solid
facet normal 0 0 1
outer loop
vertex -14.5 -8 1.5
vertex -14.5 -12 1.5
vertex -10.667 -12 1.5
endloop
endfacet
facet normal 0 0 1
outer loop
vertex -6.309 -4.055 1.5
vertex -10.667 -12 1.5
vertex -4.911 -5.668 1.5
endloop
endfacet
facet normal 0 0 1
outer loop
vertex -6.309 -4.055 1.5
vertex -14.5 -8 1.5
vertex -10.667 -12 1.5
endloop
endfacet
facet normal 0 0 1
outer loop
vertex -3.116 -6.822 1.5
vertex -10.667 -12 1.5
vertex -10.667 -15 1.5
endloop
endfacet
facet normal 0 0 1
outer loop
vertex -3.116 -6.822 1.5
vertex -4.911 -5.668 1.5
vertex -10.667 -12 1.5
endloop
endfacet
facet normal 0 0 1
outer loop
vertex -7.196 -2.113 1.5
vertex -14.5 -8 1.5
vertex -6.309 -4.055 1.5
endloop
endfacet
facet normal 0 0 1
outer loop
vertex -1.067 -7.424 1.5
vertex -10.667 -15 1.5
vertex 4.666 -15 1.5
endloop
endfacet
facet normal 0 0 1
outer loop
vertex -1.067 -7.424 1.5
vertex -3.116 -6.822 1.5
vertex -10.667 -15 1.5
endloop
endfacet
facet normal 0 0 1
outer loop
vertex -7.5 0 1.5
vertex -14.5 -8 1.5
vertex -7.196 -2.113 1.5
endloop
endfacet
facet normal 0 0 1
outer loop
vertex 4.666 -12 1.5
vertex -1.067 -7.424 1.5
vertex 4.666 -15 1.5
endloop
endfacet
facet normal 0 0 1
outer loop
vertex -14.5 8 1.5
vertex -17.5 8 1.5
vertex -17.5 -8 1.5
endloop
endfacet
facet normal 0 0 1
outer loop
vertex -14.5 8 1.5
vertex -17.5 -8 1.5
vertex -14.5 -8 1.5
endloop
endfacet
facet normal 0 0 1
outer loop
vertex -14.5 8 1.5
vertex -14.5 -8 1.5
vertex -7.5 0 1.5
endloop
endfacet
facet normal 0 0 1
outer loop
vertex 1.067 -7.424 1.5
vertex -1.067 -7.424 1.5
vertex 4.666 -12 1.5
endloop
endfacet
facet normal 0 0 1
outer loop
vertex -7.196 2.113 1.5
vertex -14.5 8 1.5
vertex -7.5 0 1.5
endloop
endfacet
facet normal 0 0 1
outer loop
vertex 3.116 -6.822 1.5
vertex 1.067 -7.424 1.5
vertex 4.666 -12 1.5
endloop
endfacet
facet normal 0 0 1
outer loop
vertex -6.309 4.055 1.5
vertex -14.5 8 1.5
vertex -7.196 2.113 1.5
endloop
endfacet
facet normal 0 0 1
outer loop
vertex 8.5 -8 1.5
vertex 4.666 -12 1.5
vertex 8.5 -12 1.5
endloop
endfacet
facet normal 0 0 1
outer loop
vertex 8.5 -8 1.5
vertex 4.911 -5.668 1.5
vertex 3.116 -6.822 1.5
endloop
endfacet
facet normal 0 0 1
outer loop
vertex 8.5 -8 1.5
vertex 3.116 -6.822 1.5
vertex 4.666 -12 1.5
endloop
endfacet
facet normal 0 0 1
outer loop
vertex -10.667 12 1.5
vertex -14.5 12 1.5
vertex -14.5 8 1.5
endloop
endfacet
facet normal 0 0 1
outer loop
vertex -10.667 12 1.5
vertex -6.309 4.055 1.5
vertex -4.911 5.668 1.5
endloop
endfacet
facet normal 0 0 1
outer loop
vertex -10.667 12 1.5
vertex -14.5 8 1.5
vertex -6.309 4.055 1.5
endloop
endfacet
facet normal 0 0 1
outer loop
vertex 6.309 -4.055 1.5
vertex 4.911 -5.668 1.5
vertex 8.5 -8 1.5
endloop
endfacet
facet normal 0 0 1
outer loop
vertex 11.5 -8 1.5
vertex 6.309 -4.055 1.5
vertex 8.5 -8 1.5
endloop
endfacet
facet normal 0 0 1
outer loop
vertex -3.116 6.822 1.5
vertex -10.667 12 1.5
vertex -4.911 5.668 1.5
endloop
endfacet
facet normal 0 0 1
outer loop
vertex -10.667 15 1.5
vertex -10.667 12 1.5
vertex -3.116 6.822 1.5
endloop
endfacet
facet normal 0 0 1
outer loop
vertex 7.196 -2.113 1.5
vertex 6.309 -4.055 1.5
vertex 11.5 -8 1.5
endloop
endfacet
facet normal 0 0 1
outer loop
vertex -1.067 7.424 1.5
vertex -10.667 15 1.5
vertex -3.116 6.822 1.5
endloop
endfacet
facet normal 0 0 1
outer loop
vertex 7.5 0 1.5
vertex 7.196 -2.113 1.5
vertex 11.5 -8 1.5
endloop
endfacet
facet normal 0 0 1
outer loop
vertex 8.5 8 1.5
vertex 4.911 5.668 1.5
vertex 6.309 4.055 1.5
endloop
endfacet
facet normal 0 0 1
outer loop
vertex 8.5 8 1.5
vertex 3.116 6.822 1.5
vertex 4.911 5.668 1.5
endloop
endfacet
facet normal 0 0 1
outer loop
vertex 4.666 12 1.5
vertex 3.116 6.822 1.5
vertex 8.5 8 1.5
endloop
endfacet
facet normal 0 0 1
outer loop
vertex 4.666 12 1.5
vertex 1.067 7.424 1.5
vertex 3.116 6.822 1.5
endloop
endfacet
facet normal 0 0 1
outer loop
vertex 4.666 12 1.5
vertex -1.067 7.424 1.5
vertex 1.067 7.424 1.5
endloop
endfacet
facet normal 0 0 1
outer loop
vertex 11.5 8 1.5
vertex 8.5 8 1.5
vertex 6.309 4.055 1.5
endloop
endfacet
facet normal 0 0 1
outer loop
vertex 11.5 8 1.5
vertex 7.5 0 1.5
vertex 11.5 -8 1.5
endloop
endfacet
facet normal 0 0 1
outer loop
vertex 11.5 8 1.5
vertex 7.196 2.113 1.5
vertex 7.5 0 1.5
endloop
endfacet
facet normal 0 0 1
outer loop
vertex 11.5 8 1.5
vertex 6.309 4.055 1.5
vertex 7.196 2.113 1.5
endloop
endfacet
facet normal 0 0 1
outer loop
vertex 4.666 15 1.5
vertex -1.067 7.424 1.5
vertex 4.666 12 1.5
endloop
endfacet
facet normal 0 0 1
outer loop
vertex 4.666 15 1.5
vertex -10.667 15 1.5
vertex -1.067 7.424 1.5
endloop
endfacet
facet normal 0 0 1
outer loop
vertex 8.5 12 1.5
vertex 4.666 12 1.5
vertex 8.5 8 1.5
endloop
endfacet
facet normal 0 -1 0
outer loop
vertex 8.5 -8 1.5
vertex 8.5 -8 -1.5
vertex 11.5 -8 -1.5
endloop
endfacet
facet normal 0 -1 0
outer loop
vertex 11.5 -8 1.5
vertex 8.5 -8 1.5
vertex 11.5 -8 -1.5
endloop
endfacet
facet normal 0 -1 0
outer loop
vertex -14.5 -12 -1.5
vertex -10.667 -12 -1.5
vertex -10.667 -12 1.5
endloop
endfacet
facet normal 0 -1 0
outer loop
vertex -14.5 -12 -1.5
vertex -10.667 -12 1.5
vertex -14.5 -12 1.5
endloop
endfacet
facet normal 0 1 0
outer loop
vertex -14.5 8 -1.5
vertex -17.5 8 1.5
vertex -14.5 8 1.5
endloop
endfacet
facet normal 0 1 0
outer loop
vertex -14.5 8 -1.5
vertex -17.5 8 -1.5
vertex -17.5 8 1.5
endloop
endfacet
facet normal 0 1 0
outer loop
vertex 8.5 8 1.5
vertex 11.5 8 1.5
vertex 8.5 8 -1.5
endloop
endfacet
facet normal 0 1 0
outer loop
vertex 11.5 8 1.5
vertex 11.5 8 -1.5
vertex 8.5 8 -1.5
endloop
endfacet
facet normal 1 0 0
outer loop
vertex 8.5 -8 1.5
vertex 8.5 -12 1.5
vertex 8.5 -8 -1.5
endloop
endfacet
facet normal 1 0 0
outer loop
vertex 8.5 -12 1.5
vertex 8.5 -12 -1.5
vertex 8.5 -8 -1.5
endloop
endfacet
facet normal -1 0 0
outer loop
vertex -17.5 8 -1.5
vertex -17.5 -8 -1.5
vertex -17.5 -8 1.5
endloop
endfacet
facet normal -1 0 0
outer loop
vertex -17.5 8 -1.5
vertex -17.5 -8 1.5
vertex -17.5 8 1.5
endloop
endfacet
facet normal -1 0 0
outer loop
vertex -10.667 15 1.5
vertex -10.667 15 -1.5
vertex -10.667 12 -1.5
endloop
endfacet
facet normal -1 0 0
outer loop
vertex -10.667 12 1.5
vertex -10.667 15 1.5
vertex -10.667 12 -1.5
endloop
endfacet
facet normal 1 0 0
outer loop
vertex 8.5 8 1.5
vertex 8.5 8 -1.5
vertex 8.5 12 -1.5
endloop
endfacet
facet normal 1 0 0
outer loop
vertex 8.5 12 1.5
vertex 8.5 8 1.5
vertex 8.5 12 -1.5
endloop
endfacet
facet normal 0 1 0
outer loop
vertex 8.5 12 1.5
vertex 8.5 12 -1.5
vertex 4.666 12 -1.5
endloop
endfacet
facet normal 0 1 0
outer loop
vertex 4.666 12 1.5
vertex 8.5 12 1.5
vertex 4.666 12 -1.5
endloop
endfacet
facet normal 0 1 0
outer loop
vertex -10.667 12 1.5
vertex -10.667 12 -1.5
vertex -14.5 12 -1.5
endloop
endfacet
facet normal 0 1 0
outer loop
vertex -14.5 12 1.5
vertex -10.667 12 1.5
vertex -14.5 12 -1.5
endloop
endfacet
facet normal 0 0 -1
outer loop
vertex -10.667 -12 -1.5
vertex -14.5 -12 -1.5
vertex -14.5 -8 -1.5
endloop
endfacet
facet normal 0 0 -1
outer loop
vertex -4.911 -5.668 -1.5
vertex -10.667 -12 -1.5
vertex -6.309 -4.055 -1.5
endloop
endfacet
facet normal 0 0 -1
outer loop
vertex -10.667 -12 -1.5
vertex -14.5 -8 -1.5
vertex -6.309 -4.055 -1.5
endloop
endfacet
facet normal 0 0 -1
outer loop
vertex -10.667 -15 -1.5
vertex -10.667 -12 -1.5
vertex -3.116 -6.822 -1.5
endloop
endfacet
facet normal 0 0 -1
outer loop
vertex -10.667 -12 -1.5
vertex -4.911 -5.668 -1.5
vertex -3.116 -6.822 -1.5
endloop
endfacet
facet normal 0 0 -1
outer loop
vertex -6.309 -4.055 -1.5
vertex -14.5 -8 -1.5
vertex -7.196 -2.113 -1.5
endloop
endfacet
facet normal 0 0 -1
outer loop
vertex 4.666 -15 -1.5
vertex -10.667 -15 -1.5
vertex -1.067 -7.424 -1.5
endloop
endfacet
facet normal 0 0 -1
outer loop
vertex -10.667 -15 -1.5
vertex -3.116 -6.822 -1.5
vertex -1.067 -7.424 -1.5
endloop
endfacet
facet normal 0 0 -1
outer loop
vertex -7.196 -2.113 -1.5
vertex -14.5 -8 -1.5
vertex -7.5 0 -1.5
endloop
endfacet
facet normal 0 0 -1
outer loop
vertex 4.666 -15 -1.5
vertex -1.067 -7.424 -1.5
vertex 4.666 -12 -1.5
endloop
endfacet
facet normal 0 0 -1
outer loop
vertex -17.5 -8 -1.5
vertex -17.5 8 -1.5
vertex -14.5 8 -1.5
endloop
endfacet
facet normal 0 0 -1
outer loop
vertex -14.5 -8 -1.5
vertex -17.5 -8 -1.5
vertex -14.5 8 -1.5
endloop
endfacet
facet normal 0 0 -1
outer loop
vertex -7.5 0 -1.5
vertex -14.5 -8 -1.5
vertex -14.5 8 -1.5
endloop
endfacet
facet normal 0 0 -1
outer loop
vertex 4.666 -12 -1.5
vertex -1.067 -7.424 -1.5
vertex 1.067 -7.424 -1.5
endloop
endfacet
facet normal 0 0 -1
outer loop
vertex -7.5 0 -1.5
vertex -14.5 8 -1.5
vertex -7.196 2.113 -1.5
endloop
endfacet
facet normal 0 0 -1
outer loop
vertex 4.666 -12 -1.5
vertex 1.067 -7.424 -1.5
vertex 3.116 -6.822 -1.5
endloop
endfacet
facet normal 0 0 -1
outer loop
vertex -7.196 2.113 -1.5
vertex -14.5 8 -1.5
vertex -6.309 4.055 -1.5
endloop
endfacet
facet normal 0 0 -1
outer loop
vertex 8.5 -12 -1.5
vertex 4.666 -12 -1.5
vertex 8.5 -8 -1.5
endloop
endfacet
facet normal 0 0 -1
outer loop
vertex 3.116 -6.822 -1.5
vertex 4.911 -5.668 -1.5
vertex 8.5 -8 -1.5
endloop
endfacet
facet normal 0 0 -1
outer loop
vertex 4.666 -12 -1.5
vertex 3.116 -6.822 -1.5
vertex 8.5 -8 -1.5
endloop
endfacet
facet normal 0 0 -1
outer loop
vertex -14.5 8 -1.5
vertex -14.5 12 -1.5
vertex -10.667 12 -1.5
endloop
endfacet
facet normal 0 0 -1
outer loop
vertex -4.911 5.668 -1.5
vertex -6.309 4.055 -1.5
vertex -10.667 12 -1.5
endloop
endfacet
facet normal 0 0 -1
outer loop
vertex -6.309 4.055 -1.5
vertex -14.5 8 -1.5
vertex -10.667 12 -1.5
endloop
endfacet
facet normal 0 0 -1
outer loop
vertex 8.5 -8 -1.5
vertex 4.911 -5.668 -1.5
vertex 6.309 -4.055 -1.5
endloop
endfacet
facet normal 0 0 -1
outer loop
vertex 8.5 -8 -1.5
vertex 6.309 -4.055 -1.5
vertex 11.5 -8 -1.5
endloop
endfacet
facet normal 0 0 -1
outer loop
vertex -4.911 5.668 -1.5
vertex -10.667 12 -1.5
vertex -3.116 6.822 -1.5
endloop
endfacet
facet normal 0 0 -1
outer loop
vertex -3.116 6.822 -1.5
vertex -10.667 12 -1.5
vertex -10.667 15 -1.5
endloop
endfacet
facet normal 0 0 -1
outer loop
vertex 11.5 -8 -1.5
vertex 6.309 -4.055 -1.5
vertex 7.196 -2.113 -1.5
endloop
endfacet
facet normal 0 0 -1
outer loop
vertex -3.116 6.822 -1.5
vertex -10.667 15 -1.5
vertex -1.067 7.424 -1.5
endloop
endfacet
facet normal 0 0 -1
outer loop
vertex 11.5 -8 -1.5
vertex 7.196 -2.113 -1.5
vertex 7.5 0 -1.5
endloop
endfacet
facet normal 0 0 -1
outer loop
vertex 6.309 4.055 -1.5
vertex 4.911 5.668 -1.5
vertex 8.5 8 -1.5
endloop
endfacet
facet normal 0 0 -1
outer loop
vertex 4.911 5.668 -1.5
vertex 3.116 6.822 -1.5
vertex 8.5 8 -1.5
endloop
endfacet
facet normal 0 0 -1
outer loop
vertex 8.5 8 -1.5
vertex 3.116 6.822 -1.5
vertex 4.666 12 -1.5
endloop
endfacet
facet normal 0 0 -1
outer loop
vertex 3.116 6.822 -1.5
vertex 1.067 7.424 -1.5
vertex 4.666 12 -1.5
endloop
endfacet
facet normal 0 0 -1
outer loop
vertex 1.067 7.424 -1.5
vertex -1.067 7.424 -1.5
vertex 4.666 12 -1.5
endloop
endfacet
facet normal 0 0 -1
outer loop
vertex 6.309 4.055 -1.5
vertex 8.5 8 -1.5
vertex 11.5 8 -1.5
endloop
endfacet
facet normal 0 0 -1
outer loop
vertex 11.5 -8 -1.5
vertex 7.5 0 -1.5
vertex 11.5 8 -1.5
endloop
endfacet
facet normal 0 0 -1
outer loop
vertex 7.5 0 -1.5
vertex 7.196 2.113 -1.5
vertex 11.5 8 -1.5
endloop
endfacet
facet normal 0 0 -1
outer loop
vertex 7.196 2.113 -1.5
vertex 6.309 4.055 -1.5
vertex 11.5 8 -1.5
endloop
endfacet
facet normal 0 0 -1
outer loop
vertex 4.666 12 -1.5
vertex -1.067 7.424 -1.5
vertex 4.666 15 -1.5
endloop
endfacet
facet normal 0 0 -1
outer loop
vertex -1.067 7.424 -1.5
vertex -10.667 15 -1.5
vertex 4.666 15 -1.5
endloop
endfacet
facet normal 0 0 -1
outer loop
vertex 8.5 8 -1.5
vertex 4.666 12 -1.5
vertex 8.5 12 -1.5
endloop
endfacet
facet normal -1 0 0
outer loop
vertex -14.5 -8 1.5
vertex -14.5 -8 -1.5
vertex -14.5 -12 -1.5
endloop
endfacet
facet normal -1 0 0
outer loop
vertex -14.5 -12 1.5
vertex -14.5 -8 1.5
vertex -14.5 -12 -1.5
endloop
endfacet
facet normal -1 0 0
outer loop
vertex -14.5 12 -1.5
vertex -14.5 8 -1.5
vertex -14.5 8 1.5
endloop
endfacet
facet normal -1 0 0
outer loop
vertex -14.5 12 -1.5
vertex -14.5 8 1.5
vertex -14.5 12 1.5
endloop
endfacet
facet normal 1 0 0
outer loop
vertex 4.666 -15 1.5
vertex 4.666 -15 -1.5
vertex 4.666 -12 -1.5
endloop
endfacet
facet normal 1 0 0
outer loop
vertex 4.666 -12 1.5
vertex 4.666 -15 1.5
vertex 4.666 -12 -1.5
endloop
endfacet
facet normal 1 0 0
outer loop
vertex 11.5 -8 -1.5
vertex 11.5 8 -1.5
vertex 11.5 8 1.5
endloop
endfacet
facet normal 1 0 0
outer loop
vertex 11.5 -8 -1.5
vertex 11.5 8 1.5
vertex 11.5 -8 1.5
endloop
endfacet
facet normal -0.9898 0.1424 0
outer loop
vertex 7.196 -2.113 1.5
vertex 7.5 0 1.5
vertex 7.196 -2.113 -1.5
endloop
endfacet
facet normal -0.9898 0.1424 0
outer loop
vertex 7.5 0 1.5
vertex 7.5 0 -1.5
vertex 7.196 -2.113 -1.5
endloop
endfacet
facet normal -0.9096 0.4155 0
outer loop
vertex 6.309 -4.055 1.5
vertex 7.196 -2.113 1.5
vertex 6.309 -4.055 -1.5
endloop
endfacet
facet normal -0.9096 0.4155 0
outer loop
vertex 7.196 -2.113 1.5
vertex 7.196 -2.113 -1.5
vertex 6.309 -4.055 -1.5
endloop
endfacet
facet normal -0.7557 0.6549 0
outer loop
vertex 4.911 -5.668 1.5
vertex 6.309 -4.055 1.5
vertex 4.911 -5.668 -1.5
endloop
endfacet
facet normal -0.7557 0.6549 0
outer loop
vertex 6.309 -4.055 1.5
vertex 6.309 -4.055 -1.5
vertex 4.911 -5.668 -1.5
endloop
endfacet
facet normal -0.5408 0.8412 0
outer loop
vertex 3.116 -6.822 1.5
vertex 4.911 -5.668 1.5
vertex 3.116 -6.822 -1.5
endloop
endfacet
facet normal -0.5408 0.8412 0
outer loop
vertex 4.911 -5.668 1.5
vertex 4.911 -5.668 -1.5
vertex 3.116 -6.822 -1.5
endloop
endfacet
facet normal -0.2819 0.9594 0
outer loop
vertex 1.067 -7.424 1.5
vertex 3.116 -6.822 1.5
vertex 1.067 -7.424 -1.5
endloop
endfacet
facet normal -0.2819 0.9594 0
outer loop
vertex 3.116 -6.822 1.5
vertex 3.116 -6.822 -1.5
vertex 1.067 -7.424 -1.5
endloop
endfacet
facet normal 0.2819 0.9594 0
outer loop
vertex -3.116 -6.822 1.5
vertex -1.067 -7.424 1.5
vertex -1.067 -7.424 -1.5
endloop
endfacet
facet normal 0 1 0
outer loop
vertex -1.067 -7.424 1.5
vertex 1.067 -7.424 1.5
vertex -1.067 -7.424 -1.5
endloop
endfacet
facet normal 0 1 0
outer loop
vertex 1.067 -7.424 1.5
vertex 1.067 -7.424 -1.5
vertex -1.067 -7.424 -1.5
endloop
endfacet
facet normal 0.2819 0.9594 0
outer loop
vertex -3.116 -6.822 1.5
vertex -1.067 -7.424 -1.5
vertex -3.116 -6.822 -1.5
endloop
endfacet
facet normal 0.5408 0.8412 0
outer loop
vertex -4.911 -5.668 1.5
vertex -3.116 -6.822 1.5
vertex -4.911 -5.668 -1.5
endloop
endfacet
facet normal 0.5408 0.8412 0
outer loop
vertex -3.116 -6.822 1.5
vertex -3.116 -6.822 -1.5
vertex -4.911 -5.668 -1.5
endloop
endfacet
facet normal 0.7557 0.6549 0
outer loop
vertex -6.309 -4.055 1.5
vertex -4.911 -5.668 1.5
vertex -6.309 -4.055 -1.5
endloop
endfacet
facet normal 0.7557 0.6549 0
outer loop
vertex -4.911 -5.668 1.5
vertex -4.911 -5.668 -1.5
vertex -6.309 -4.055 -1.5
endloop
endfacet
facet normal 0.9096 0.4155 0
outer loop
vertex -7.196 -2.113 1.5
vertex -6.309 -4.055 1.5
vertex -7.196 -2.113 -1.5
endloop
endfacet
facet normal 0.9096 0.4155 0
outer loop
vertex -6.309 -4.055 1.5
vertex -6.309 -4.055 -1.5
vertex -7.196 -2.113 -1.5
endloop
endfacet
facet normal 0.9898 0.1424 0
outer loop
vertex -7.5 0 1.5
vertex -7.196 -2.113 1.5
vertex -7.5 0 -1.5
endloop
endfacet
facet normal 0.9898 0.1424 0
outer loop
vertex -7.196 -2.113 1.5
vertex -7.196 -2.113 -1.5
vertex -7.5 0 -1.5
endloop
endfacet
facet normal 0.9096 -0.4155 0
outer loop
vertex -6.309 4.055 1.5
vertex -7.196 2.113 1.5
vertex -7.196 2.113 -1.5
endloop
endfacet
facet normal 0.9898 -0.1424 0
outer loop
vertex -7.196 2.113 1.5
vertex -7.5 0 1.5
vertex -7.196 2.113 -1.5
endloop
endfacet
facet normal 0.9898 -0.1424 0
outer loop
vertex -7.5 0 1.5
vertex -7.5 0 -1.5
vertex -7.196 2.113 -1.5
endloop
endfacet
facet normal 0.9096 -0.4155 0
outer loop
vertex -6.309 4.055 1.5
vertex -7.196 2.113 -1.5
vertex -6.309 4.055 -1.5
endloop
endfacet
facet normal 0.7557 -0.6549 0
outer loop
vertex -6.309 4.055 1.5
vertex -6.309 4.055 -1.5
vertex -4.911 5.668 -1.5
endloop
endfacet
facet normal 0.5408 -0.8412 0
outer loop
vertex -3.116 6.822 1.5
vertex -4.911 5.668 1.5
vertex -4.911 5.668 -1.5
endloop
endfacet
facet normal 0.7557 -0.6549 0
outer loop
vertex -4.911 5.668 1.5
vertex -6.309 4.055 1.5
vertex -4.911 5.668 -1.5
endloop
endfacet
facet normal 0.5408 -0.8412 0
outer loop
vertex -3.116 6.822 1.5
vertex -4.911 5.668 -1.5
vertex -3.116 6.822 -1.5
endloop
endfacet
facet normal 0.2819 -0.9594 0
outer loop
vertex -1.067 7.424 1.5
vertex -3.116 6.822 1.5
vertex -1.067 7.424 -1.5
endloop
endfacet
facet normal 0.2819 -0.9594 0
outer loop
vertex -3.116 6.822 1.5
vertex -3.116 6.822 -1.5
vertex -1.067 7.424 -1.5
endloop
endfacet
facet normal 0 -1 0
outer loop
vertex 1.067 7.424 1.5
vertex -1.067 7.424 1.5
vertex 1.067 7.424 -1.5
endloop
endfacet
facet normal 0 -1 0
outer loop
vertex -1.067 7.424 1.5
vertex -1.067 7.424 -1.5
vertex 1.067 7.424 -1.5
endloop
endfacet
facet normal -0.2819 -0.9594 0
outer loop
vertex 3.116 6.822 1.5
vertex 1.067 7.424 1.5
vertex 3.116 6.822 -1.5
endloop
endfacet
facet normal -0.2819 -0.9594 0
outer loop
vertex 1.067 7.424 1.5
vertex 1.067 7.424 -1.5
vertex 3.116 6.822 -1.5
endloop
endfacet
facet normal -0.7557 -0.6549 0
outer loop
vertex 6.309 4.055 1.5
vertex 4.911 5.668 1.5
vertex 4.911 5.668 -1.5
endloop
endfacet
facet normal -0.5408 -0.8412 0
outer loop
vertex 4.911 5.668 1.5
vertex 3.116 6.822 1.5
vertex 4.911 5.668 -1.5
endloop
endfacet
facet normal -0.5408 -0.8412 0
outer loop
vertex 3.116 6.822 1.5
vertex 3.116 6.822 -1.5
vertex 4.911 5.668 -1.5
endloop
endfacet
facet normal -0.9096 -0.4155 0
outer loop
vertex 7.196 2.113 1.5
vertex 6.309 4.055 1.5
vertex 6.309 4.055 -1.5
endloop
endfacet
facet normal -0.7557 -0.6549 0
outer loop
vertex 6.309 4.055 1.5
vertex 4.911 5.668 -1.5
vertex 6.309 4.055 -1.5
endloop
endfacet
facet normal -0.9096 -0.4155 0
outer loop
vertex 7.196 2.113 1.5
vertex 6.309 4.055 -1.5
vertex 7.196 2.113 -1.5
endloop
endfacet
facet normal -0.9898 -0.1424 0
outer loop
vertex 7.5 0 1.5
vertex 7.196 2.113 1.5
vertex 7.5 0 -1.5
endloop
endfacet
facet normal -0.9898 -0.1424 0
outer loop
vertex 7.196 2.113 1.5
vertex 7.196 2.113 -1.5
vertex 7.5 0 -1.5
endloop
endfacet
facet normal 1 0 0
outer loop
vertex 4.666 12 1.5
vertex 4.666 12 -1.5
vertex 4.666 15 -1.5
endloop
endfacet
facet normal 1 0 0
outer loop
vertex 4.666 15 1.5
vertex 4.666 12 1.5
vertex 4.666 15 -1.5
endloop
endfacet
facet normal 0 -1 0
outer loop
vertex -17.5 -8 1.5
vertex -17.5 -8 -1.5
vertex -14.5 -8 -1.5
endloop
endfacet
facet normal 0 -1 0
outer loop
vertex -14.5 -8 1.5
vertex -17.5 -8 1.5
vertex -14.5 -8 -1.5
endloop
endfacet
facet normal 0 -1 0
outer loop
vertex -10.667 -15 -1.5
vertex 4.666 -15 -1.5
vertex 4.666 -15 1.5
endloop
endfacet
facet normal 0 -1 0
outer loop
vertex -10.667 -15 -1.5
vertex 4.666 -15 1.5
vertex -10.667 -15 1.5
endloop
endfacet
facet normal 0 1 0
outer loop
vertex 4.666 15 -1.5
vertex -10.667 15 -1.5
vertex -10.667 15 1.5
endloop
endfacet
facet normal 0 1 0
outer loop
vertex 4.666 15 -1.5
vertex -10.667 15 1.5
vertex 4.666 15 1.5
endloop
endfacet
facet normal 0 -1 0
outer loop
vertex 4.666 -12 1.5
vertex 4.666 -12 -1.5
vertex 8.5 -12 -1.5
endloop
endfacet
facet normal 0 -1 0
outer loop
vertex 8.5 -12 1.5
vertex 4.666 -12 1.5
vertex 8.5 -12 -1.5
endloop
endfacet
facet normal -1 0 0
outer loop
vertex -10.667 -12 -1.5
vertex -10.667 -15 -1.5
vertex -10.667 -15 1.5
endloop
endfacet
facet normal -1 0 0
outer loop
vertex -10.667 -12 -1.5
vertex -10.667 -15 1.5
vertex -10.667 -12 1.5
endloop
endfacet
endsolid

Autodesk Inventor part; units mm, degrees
ref_plane "YZ Plane" through (0, 0, 0) normal (1, 0, 0) x (0, 1, 0)
ref_plane "XZ Plane" through (0, 0, 0) normal (0, 1, 0) x (-1, 0, 0)
ref_plane "XY Plane" through (0, 0, 0) normal (0, 0, 1) x (1, 0, 0)
sketch "Sketch1" plane through (0, 0, 0) normal (0, 0, 1) x (1, 0, 0)
  circle A0 centre (0, 0) radius 7.5
  line L0 (11.4997, 8) -> (8.4997, 8)
  line L1 (8.4997, 8) -> (8.4997, 12)
  line L2 (8.4997, -12) -> (8.4997, -8)
  line L3 (8.4997, -8) -> (11.4997, -8)
  line L4 (-10.667, -15) -> (-10.667, -12)
  line L5 (-10.667, -12) -> (-14.5003, -12)
  line L6 (4.6663, -15) -> (4.6663, -12)
  line L7 (4.6663, -12) -> (8.4997, -12)
  line L8 (-17.5003, -8) -> (-14.5003, -8)
  line L9 (-14.5003, -8) -> (-14.5003, -12)
  line L10 (-17.5003, 8) -> (-14.5003, 8)
  line L11 (-14.5003, 8) -> (-14.5003, 12)
  line L12 (-10.667, 15) -> (-10.667, 12)
  line L13 (-10.667, 12) -> (-14.5003, 12)
  line L14 (8.4997, 12) -> (4.6663, 12)
  line L15 (4.6663, 12) -> (4.6663, 15)
  line L16 (11.4997, 8) -> (11.4997, -8)
  line L17 (-10.667, 15) -> (4.6663, 15)
  line L18 (-17.5003, -8) -> (-17.5003, 8)
  line L19 (4.6663, -15) -> (-10.667, -15)
  line L20 (11.4997, -7) -> (11.4997, 8)
  line L21 (-20.9424, 0) -> (31.3224, 0) construction
  line L22 (-0.0003, 36) -> (-0.0003, -23) construction
  dimension "d0" = 15
  dimension "d3" = 3
  dimension "d5" = 3
  dimension "d6" = 3
  dimension "d15" = 30
  dimension "d16" = 3
  dimension "d22" = 8.5
  dimension "d23" = 14.5
  dimension "d24" = 23
  dimension "d25" = 15.3333
  dimension "d26" = 24
  dimension "d27" = 16
extrude "Extrusion1" add sketch "Sketch1" along normal mid plane 3
equation "\"d25\" = 0.666667 * d24"
equation "\"d27\" = 0.666667 * d26"
properties part number "Camera-Holder_Bearing-Ring-Middle-Left"
